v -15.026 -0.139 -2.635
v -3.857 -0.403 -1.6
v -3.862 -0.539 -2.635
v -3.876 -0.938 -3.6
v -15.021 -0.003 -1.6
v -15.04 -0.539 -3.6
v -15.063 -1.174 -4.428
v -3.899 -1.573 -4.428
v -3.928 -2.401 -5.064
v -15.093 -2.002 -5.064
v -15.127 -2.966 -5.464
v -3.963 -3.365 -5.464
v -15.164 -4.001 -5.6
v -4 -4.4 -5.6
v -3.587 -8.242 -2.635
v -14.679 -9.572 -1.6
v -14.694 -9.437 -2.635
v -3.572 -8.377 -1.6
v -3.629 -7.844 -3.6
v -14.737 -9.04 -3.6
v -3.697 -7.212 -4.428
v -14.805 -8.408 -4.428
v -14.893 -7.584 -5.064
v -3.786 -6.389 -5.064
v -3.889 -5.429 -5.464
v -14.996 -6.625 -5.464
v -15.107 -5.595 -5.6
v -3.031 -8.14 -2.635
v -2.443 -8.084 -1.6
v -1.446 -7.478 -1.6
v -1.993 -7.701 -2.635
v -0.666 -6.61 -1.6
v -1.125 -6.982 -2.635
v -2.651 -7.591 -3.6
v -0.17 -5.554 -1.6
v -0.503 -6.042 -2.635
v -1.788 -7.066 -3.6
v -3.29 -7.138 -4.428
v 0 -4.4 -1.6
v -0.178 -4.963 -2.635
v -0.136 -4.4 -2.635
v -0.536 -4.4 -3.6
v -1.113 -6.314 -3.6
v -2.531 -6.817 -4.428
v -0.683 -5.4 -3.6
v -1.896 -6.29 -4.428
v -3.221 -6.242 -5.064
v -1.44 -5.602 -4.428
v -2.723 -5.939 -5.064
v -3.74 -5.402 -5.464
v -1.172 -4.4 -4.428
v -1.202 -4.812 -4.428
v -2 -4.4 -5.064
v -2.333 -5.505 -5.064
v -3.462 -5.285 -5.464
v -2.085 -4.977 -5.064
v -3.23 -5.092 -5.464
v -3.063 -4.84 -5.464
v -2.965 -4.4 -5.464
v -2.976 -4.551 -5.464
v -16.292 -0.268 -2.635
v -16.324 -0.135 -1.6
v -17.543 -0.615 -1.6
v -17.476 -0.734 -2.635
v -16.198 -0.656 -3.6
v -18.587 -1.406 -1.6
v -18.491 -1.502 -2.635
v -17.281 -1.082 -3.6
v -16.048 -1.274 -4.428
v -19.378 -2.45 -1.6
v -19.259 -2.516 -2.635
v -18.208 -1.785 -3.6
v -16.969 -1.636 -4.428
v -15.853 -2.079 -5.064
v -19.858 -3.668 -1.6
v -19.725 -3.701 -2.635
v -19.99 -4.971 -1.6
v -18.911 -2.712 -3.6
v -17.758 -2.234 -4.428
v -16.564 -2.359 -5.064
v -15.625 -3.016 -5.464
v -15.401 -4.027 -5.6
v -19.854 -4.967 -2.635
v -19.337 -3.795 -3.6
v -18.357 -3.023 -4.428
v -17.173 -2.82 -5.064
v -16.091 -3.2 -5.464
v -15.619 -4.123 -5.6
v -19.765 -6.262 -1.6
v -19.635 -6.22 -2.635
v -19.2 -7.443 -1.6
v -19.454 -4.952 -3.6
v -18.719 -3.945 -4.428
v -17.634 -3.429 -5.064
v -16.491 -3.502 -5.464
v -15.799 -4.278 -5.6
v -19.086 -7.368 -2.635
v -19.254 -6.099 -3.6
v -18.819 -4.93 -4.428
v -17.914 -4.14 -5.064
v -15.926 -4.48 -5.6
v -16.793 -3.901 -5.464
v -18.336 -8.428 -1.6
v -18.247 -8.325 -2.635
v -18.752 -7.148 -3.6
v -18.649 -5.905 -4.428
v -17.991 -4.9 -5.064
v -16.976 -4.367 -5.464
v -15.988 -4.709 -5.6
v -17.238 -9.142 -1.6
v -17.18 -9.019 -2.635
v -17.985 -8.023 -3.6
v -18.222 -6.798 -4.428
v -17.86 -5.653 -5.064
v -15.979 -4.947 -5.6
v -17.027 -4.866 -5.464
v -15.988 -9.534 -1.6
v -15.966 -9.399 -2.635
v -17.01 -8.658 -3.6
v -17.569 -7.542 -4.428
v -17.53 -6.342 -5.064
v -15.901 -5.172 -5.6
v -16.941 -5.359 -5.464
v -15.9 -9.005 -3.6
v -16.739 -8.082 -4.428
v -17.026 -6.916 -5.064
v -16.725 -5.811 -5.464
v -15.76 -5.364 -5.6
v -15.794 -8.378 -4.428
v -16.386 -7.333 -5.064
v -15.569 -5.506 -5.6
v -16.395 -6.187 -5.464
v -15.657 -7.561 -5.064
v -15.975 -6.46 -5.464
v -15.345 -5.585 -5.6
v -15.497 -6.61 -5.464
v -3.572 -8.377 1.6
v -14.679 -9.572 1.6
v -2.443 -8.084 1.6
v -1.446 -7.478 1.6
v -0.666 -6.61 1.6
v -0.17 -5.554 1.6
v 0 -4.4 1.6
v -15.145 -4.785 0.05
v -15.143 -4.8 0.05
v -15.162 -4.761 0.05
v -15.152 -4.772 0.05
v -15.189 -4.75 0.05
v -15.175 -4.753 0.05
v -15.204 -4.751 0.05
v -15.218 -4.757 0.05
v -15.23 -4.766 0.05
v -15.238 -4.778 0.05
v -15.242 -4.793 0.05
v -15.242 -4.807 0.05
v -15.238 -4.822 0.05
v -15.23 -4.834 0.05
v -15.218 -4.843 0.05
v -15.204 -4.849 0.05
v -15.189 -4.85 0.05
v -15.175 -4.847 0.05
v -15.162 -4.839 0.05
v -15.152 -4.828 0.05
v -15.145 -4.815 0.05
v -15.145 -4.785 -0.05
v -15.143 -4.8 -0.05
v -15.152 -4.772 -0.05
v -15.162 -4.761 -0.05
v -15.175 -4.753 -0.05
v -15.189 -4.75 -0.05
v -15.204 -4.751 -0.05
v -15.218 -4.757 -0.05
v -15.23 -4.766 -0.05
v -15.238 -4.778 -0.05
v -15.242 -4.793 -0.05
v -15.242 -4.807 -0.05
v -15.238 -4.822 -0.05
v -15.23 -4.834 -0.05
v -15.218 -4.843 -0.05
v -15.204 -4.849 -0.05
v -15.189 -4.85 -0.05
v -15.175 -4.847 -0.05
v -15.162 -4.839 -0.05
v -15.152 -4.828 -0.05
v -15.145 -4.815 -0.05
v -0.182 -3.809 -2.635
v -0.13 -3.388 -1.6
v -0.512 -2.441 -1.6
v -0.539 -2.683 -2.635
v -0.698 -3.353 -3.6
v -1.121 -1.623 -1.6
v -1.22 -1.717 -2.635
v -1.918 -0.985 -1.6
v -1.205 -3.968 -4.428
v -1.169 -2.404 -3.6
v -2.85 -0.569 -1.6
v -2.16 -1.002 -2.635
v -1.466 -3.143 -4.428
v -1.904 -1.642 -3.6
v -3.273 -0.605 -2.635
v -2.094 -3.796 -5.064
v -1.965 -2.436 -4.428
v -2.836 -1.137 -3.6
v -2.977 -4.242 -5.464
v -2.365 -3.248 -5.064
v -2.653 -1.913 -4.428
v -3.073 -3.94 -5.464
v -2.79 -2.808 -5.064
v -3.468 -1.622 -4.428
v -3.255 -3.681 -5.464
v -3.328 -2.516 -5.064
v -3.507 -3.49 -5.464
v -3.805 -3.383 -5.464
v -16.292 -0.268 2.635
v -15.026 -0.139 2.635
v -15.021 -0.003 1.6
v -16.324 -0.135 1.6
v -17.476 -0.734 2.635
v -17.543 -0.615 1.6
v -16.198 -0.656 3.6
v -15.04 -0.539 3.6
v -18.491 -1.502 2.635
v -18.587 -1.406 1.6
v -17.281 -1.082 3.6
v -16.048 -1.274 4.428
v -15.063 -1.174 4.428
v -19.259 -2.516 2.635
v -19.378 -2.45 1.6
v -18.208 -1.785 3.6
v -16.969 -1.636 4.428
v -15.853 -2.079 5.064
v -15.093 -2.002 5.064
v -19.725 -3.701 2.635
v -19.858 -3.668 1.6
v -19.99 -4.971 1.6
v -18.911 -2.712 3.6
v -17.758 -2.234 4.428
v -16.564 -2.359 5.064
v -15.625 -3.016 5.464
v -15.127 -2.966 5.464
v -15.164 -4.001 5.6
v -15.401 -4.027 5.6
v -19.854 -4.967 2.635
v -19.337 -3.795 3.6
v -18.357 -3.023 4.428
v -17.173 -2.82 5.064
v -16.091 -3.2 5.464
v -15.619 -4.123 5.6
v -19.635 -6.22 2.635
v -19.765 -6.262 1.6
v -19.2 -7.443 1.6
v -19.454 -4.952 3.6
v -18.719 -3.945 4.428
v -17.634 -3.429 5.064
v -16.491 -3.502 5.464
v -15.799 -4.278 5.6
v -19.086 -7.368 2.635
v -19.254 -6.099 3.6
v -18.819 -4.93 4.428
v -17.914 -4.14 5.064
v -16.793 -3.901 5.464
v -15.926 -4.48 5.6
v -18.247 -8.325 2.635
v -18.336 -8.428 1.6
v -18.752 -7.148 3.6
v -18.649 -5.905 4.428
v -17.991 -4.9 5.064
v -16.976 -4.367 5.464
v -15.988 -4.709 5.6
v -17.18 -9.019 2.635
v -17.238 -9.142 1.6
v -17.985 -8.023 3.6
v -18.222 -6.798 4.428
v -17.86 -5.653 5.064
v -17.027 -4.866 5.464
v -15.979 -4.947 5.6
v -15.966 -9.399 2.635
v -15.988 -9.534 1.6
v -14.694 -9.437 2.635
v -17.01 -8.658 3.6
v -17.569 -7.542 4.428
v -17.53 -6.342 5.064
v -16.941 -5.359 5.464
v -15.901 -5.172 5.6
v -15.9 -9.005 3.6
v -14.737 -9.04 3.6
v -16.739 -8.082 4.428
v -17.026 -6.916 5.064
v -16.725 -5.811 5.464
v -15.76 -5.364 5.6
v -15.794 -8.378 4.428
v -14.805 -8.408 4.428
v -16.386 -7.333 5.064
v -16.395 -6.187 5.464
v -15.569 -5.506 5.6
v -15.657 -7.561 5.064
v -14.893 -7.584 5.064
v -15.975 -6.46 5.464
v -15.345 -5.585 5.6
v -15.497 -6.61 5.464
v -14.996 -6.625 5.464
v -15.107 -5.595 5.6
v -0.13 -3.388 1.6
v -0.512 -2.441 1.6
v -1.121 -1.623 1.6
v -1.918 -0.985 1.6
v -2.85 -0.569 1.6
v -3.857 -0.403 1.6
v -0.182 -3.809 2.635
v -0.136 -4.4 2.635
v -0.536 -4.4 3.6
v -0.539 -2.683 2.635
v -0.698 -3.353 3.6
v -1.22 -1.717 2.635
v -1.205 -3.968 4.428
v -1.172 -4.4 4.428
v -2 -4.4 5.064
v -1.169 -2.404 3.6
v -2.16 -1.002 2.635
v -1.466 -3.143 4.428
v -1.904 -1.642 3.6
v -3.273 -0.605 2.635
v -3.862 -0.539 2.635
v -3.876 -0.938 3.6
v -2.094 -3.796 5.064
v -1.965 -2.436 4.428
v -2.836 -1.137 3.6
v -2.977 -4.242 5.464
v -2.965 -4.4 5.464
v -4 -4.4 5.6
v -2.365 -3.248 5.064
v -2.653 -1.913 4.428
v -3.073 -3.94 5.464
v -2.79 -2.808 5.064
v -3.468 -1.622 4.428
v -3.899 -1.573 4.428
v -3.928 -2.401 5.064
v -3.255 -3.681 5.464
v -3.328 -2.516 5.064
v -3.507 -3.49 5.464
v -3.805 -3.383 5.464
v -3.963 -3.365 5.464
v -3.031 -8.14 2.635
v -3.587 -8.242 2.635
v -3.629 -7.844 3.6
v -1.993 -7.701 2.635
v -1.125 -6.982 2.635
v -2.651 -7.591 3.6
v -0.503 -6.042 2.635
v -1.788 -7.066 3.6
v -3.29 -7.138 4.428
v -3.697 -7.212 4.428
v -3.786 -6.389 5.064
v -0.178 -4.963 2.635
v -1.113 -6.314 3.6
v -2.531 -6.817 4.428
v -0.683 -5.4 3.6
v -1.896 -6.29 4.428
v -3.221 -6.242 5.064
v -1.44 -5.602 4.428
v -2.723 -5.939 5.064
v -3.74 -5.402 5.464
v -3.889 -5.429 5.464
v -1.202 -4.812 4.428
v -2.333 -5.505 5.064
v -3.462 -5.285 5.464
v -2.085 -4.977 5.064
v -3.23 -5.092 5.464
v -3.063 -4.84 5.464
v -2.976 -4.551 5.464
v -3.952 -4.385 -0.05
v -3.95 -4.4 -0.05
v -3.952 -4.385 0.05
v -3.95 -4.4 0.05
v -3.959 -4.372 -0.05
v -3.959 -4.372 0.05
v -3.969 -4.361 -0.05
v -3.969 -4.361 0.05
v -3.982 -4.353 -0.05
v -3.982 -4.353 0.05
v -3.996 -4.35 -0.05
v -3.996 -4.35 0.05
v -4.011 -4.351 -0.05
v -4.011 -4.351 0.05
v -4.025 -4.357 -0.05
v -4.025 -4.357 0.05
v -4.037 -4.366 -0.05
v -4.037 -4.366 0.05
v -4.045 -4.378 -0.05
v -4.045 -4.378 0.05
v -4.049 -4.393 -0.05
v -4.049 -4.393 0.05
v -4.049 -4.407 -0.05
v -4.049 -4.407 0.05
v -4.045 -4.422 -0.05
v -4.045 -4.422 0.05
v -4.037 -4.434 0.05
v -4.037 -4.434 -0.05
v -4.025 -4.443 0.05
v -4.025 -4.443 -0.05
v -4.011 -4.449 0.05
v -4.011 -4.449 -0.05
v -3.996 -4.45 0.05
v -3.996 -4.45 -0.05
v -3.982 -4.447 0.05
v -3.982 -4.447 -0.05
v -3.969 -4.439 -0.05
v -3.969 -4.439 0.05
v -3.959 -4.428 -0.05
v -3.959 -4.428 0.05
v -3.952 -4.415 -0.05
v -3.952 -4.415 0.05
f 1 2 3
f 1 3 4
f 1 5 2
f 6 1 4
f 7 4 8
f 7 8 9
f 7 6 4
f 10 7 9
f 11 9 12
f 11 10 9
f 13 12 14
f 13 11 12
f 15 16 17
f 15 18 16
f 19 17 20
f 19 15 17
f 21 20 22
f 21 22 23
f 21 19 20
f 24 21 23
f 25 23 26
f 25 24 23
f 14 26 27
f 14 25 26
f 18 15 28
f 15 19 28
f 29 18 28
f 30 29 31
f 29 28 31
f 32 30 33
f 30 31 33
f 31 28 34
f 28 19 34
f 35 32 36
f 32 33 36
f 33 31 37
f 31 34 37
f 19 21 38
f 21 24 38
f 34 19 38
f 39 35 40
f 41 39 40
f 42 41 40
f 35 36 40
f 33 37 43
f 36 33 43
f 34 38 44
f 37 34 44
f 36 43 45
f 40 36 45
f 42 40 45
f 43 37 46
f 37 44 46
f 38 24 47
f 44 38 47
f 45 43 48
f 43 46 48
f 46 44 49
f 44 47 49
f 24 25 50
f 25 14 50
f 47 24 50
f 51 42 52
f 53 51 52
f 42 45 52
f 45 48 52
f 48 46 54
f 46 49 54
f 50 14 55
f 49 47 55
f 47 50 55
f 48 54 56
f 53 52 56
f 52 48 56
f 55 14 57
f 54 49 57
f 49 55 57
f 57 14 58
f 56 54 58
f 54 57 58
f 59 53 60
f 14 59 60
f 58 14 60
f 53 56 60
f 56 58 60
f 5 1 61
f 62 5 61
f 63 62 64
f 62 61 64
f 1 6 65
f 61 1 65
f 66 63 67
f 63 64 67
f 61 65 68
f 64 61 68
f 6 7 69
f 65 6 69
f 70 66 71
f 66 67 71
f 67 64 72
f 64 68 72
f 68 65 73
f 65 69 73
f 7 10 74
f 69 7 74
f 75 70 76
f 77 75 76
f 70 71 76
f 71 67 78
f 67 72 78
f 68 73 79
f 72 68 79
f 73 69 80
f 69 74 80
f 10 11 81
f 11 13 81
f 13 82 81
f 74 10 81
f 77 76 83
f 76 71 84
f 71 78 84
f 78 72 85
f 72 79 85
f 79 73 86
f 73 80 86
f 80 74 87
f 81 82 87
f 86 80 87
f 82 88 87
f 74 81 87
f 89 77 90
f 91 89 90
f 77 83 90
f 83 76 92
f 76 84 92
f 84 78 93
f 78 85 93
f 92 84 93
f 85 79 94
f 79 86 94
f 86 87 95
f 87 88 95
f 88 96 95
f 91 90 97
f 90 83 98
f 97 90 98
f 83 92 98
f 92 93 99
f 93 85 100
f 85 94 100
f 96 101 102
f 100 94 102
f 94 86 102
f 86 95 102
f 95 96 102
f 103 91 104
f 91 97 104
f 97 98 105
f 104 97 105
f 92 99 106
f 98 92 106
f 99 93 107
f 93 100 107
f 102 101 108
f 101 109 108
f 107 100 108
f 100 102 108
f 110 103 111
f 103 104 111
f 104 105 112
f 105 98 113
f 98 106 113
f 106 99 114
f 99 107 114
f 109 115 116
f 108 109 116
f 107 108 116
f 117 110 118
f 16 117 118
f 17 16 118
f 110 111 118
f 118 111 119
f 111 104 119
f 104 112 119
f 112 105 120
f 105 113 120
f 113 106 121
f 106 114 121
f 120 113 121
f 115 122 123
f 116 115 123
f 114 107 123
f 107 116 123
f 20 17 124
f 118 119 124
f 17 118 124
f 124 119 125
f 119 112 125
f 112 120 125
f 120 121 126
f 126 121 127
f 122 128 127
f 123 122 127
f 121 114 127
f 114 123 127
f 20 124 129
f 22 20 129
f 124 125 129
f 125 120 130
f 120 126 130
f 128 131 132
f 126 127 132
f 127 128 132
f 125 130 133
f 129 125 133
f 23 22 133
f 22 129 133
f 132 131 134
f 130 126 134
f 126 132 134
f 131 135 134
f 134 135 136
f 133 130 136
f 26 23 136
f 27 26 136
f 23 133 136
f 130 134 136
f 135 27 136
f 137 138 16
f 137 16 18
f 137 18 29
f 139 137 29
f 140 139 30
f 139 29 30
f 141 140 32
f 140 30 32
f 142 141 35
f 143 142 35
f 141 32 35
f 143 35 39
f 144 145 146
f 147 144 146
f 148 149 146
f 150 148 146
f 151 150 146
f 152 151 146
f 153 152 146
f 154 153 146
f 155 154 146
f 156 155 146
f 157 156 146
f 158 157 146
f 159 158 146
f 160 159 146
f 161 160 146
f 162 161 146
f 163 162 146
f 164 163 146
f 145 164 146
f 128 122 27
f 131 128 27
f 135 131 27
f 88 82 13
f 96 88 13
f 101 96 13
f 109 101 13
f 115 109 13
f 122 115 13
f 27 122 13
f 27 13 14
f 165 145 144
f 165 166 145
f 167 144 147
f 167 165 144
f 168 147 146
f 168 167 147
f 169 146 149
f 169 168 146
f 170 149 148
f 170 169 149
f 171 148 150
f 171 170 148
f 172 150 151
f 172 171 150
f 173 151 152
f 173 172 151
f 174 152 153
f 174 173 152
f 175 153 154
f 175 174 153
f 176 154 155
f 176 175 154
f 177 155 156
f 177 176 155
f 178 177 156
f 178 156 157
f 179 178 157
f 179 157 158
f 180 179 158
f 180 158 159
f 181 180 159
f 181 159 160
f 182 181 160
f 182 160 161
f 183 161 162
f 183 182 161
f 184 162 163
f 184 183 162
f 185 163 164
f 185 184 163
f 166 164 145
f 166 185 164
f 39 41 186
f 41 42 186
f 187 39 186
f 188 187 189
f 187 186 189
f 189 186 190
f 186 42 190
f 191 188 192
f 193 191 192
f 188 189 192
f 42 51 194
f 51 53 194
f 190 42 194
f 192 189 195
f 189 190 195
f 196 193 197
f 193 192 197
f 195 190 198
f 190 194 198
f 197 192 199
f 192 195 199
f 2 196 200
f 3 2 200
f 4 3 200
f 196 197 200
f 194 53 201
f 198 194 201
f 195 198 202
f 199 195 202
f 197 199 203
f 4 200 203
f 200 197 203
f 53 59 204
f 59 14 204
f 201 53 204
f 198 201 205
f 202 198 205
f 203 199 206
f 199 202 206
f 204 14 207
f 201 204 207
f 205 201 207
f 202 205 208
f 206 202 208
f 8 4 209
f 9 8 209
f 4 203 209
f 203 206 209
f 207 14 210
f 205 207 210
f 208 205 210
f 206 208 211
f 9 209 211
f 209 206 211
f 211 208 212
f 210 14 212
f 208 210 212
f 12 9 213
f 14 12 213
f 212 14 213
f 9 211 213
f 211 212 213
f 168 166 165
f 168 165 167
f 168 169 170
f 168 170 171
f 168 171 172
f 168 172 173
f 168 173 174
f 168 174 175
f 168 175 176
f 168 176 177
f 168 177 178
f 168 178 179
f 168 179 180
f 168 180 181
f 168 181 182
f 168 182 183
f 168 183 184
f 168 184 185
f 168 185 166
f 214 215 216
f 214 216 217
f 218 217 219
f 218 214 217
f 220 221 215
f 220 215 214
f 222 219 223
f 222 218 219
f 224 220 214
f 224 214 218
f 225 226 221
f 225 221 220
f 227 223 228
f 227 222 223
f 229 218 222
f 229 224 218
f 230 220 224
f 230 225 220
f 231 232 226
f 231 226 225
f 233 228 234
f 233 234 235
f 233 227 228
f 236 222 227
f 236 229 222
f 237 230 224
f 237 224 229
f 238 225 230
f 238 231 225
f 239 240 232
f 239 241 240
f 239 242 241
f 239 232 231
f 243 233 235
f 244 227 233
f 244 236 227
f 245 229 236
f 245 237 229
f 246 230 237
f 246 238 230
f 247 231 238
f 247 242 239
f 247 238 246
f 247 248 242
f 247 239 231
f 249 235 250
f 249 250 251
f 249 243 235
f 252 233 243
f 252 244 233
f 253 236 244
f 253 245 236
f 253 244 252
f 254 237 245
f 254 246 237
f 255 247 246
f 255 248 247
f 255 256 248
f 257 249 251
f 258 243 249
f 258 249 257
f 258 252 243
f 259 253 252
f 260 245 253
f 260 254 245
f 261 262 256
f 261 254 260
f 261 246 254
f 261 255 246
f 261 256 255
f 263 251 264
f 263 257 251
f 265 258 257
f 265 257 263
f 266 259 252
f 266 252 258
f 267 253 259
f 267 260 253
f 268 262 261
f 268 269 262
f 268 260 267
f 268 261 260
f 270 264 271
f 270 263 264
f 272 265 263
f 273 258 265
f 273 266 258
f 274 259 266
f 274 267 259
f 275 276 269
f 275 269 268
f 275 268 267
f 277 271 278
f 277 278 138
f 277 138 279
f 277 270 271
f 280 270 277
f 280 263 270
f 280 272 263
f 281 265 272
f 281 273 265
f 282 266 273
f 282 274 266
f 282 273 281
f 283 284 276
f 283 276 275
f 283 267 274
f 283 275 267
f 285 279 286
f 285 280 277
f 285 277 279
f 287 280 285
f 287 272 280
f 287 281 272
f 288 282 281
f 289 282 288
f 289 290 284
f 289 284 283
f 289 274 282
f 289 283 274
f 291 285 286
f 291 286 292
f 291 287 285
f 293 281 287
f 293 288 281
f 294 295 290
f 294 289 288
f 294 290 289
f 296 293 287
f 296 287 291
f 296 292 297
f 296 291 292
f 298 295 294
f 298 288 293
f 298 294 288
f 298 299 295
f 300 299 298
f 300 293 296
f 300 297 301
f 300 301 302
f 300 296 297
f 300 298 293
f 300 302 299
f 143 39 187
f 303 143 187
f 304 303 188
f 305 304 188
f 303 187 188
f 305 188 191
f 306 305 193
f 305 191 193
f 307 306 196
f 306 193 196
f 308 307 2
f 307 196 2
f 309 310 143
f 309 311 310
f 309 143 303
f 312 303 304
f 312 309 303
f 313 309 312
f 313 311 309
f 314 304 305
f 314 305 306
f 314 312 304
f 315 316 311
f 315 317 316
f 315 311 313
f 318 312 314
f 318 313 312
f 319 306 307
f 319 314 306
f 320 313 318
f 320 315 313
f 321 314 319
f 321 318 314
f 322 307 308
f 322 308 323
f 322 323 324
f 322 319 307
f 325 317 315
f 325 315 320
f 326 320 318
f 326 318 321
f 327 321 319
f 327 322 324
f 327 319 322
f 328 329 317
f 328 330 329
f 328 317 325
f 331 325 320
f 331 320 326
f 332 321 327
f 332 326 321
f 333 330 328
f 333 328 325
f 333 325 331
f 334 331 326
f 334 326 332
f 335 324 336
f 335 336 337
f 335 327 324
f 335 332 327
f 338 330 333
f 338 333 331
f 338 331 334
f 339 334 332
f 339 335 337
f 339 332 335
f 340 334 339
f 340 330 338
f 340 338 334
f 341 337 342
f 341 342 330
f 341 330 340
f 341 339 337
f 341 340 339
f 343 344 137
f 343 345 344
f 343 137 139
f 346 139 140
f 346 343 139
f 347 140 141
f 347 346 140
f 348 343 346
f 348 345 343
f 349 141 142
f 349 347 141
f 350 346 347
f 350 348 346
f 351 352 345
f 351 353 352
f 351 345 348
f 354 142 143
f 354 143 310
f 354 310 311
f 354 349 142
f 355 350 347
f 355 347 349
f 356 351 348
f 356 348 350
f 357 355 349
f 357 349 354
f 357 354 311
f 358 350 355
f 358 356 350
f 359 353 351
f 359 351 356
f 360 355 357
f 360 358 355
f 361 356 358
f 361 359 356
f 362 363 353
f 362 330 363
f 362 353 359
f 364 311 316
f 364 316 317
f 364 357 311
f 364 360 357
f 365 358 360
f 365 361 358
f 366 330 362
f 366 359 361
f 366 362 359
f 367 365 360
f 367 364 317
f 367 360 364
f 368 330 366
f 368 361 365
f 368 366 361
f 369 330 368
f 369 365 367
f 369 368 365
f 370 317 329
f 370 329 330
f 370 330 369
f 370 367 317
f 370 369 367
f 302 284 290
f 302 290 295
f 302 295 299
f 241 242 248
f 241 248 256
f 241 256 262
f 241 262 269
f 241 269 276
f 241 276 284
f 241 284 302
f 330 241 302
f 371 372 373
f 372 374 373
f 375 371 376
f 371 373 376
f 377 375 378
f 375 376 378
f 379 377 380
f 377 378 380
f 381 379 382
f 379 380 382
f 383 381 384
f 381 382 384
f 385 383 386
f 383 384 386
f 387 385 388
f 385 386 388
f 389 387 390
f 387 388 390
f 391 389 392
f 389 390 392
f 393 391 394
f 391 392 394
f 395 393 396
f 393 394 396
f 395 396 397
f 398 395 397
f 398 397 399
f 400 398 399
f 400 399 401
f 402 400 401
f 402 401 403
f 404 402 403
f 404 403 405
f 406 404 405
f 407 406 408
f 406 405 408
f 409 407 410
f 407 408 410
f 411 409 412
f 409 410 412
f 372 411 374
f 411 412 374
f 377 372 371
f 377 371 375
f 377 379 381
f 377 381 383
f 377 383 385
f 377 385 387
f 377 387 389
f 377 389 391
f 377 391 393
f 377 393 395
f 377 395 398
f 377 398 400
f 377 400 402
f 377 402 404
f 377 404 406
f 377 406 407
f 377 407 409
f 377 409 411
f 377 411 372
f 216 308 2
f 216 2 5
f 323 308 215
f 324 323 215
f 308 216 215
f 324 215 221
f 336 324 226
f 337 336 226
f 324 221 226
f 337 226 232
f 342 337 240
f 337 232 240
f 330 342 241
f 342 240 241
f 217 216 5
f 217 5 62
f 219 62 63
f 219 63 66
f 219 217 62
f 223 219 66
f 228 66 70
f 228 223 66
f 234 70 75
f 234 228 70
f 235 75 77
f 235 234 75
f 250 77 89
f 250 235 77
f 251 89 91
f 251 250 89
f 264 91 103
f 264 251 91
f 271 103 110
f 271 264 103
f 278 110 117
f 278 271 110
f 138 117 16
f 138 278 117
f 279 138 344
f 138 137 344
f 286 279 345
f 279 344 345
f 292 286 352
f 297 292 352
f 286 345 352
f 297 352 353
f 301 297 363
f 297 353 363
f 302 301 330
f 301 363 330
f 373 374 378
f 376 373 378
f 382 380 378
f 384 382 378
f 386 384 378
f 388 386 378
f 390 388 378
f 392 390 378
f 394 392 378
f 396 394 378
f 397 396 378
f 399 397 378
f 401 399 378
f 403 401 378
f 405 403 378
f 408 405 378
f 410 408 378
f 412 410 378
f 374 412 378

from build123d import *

# Parameters (mm, degrees)
F1_R     = 0.05
F2_DEPTH = 5.6
F3_DEPTH = 0.05
F4_R     = 4


# Not quite as in the source:
# - a feature names something its author has since deleted; it is built from what else it names


with BuildPart() as f2:
    # F1 (on Top) → F2 (new body, symmetric)
    with BuildSketch(Plane.XY):
        with BuildLine():
            ThreePointArc((-14.6792257551, -9.5724401661), (-11.6217612132, -8.0073805729), (-10.3928548637, -4.8))
            ThreePointArc((-10.3928548637, -4.8), (-11.7385887293, -1.4671265442), (-15.0212071439, -0.003070038))
            ThreePointArc((-15.0212071439, -0.003070038), (-19.9897926624, -4.9714285714), (-14.6792257551, -9.5724401661))
        make_face()
        with Locations((-15.1928548637, -4.8)):
            Circle(F1_R, mode=Mode.SUBTRACT)
        with BuildLine():
            ThreePointArc((-15.0212071439, -0.003070038), (-11.7385887293, -1.4671265442), (-10.3928548637, -4.8))
            ThreePointArc((-10.3928548637, -4.8), (-11.6217612132, -8.0073805729), (-14.6792257551, -9.5724401661))
            Line((-14.6792257551, -9.5724401661), (-3.5719757428, -8.3770334717))
            ThreePointArc((-3.5719757428, -8.3770334717), (-7.9974481656, -4.5428571429), (-3.8569602335, -0.402558365))
            Line((-3.8569602335, -0.402558365), (-15.0212071439, -0.003070038))
        make_face()
        with BuildLine():
            ThreePointArc((0, -4.4), (-1.121444888, -1.6226054535), (-3.8569602335, -0.402558365))
            ThreePointArc((-3.8569602335, -0.402558365), (-7.9974481656, -4.5428571429), (-3.5719757428, -8.3770334717))
            ThreePointArc((-3.5719757428, -8.3770334717), (-1.0240886246, -7.0728171441), (0, -4.4))
        make_face()
        with Locations((-4, -4.4)):
            Circle(F1_R, mode=Mode.SUBTRACT)
        with Locations((-15.1928548637, -4.8)):
            Circle(F1_R)
        with Locations((-4, -4.4)):
            Circle(F1_R)
    extrude(amount=F2_DEPTH, both=True)

    # F1 (on Top) → F3 (cut, symmetric)
    with BuildSketch(Plane.XY):
        with Locations((-15.1928548637, -4.8)):
            Circle(F1_R)
        with Locations((-4, -4.4)):
            Circle(F1_R)
    extrude(amount=F3_DEPTH, both=True, mode=Mode.SUBTRACT)

    # F4
    f4_edges = [f2.edges().sort_by_distance(p)[0] for p in [
        (-19.989793, -4.971429, 5.6),
        (-9.125601, -8.974737, 5.6),
        (-0.002552, -4.257143, 5.6),
        (-9.439084, -0.202814, 5.6),
        (-19.989793, -4.971429, -5.6),
        (-9.125601, -8.974737, -5.6),
        (-0.002552, -4.257143, -5.6),
        (-9.439084, -0.202814, -5.6),
    ]]
    fillet(f4_edges, radius=F4_R)


solid = f2.part
